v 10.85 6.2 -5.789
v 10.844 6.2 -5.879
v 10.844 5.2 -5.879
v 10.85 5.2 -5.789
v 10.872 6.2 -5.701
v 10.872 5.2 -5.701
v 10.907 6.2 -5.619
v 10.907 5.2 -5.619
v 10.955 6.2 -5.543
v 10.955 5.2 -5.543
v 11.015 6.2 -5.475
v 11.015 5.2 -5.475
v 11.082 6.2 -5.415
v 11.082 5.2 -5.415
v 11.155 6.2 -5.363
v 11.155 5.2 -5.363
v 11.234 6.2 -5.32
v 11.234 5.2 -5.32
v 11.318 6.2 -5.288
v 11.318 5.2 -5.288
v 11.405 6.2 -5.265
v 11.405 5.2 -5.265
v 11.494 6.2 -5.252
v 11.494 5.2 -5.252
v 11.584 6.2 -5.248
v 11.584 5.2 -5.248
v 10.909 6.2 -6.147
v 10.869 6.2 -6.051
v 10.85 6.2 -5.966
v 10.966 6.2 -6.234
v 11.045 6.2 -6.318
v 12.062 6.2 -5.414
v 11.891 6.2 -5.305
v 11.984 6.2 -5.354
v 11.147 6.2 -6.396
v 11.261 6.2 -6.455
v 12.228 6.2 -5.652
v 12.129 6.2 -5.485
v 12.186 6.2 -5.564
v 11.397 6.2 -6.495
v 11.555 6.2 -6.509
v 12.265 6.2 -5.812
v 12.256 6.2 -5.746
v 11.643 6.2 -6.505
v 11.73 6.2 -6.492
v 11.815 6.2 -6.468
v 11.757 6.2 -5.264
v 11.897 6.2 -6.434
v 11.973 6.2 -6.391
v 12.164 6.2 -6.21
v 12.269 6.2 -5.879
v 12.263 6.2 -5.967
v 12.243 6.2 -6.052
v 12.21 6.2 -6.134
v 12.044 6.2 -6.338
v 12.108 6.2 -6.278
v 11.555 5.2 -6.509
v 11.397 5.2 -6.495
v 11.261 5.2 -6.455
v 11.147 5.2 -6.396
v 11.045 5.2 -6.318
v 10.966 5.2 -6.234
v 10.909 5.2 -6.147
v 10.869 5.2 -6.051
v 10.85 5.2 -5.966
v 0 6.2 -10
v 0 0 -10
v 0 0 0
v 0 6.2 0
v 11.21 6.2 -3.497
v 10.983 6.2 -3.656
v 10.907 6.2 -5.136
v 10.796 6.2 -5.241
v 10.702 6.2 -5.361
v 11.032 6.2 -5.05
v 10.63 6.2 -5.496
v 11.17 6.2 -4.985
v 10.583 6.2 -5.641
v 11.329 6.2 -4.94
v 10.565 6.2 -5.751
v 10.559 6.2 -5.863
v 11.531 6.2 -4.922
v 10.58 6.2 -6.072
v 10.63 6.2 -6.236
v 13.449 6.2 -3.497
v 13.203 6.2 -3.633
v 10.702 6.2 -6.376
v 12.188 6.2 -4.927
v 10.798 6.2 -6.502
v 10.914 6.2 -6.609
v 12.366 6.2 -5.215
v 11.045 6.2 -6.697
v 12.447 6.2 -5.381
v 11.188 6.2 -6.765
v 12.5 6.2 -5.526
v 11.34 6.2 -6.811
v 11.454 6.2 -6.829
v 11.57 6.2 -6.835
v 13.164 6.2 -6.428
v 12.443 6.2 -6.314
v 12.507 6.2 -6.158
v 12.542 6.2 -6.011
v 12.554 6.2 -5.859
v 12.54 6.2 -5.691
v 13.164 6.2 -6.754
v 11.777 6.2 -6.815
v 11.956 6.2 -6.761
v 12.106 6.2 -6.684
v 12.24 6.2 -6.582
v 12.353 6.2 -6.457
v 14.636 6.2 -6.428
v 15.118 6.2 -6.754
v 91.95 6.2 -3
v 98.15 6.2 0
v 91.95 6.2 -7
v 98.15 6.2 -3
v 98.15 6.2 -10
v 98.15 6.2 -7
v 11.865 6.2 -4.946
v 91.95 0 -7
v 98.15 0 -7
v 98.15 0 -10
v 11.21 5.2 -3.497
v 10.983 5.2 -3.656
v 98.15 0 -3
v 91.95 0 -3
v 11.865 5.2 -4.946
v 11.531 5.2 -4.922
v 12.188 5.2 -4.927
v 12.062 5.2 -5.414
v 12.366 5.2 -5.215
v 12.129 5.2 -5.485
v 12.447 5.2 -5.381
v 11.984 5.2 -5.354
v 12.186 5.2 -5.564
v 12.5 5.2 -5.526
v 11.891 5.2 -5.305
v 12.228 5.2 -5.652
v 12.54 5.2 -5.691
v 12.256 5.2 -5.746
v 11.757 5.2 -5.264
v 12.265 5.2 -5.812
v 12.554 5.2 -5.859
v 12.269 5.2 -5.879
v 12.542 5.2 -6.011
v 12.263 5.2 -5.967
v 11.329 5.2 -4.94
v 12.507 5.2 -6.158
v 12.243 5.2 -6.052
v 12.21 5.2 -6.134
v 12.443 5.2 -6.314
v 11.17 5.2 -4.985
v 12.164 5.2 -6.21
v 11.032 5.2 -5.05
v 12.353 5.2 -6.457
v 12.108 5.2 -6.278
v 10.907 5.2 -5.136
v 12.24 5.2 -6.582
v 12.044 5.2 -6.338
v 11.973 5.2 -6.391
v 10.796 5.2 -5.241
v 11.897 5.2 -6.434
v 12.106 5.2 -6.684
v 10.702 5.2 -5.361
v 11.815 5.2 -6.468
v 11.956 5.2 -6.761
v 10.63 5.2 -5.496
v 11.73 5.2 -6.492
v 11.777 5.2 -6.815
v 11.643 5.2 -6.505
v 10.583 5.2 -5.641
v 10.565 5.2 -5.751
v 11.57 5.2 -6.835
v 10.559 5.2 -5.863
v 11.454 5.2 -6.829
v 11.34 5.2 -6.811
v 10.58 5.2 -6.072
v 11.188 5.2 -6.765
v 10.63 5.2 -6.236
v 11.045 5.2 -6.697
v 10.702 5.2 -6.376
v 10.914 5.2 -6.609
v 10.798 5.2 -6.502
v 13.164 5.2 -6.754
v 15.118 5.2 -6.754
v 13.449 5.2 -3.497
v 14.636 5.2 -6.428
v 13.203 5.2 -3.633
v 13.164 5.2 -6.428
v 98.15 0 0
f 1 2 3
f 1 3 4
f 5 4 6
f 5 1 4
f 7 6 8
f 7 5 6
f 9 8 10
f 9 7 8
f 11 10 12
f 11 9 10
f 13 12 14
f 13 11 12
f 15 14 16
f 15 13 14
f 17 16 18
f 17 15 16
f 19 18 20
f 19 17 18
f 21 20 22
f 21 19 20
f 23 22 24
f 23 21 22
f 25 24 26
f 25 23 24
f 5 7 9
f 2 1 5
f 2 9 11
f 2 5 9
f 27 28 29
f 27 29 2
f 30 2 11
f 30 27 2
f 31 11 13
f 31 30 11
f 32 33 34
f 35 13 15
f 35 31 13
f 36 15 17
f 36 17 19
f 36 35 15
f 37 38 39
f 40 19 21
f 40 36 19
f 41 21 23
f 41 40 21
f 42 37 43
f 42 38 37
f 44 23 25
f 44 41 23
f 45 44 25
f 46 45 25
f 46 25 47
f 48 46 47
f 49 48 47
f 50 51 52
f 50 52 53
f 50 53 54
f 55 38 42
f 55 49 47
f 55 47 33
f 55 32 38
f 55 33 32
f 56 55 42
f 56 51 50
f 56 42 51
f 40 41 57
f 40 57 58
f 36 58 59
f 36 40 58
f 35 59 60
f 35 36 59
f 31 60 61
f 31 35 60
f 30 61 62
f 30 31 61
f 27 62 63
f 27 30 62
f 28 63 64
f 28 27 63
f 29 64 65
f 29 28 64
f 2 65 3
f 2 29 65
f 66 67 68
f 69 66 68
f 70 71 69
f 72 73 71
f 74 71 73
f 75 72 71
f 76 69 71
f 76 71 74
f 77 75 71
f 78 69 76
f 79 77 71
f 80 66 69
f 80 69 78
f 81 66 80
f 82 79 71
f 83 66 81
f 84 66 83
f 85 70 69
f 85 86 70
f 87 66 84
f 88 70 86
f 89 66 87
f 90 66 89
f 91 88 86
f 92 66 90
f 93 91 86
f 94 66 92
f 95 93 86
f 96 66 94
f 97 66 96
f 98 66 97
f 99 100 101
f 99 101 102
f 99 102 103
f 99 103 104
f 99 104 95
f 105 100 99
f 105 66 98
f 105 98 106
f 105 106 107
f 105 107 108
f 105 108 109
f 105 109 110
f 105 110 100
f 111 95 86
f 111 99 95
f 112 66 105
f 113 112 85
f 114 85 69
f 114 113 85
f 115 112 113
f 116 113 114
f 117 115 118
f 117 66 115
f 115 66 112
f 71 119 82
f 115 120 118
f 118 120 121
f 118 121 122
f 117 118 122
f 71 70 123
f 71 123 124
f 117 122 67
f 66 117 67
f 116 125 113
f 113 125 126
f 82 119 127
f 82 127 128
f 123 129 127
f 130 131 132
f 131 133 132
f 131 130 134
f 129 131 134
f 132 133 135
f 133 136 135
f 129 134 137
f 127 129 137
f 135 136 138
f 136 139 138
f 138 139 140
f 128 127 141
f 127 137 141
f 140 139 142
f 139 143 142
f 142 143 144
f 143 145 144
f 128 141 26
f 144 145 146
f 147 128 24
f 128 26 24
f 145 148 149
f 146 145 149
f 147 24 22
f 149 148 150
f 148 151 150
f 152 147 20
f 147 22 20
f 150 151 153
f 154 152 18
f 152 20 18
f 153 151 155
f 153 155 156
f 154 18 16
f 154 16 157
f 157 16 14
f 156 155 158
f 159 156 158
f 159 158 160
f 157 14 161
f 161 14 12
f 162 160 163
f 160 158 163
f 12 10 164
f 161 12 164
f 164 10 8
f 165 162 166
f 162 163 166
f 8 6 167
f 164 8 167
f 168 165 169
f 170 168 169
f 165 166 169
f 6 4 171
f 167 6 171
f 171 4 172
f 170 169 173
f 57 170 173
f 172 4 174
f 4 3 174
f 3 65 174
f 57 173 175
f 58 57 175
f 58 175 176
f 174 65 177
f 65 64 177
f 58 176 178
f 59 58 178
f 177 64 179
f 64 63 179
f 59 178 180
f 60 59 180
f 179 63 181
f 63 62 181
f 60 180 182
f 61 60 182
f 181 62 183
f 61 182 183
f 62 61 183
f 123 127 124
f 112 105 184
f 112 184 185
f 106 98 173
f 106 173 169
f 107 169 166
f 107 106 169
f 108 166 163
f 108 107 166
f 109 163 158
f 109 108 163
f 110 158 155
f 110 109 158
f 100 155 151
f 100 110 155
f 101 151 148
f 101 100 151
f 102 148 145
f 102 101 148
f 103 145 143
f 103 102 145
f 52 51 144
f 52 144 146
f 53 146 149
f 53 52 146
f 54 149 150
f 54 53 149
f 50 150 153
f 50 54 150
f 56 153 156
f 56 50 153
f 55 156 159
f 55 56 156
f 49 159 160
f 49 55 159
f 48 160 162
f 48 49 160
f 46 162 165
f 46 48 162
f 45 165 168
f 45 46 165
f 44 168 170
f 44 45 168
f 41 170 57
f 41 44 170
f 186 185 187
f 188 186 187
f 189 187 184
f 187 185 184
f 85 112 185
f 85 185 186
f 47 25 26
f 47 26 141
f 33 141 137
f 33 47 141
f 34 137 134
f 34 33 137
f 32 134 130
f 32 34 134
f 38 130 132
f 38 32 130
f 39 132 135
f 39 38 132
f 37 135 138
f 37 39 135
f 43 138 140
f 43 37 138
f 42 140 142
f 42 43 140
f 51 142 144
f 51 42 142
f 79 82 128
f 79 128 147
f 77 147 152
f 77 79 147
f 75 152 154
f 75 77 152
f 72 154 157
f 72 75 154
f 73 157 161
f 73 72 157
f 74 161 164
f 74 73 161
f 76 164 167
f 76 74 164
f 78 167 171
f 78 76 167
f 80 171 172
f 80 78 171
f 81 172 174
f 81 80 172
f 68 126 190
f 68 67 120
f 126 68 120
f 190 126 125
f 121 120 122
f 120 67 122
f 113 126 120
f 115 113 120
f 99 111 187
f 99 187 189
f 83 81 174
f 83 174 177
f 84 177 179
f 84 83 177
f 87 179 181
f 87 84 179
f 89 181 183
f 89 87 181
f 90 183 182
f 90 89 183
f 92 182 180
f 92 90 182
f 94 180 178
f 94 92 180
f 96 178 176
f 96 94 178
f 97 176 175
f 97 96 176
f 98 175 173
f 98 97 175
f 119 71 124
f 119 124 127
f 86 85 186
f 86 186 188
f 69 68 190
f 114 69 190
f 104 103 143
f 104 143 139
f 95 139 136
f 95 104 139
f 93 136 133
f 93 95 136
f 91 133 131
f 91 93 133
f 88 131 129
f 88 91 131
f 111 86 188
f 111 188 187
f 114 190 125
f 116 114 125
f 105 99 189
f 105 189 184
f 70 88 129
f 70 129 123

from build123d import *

# Parameters (mm, degrees)
BOSS_EXTRUDE1_DEPTH = 6.2
CUT_EXTRUDE1_DEPTH  = 1


with BuildPart() as part:
    # Sketch1 → Boss-Extrude1 (new body)
    with BuildSketch(Plane(origin=(0, 0, 0), x_dir=(1, 0, 0), z_dir=(0, 1, 0))):
        Polygon((0, 0), (91.95, 0), (98.15, 0), (98.15, 3), (93.712314791, 3), (91.95, 3), (91.95, 7), (93.712314791, 7), (98.15, 7), (98.15, 10), (91.95, 10), (0, 10), align=None)
    extrude(amount=BOSS_EXTRUDE1_DEPTH)

    # Sketch2 → Cut-Extrude1 (cut)
    with BuildSketch(Plane(origin=(0, 6.2, 0), x_dir=(1, 0, 0), z_dir=(0, 1, 0))):
        with BuildLine():
            Line((11.210257143, 3.497319833), (10.982562832, 3.655688223))
            Line((10.982562832, 3.655688223), (11.8653553, 4.94616799))
            add(Edge.make_bspline(
                [(11.8653553, 4.94616799), (11.809030133, 4.939279997), (11.698122738, 4.925717154), (11.586419796, 4.923225546), (11.531446045, 4.92199932)],
                knots=[0, 0, 0, 0, 0.000170115, 0.000334967, 0.000334967, 0.000334967, 0.000334967], degree=3))
            add(Edge.make_bspline(
                [(11.531446045, 4.92199932), (11.498115759, 4.922853011), (11.432691322, 4.924528731), (11.336505466, 4.937810943), (11.244080707, 4.958267131), (11.155662077, 4.988791358), (11.070917241, 5.026726448), (10.990031201, 5.073768168), (10.913112843, 5.129109589), (10.840988264, 5.192458089), (10.775391186, 5.262016036), (10.716950052, 5.335635798), (10.668380597, 5.414172571), (10.62803398, 5.496024271), (10.59743564, 5.582367353), (10.575153909, 5.672219309), (10.561435774, 5.76620987), (10.559803737, 5.830186239), (10.558975092, 5.862669392)],
                knots=[0, 0, 0, 0, 9.9954e-05, 0.000196201, 0.000290782, 0.000383503, 0.000476303, 0.000568919, 0.000663705, 0.000760153, 0.000856434, 0.000950205, 0.001041624, 0.001132931, 0.001223461, 0.001315861, 0.001410305, 0.001507717, 0.001507717, 0.001507717, 0.001507717], degree=3))
            add(Edge.make_bspline(
                [(10.558975092, 5.862669392), (10.560548472, 5.907090956), (10.563636698, 5.994281474), (10.588491067, 6.121674964), (10.629367232, 6.242131329), (10.686361545, 6.355333862), (10.758148043, 6.459654147), (10.844425121, 6.553641957), (10.944668003, 6.635960503), (11.05659312, 6.706721344), (11.17756336, 6.763630949), (11.304262786, 6.8055766), (11.435720595, 6.83024975), (11.524772696, 6.833502638), (11.569607103, 6.835140346)],
                knots=[0, 0, 0, 0, 0.000133185, 0.000261414, 0.000387724, 0.00051373, 0.000640399, 0.00076644, 0.000895188, 0.001028407, 0.001162697, 0.001295241, 0.001427846, 0.0015623, 0.0015623, 0.0015623, 0.0015623], degree=3))
            add(Edge.make_bspline(
                [(11.569607103, 6.835140346), (11.613593027, 6.833480127), (11.700505066, 6.83019969), (11.828311522, 6.806174946), (11.950722301, 6.765683107), (12.067058825, 6.709726396), (12.174772434, 6.639585287), (12.271633349, 6.556006112), (12.355431159, 6.458936812), (12.426028537, 6.35072511), (12.482697788, 6.234459349), (12.523584787, 6.113098219), (12.548754046, 5.987514522), (12.551925714, 5.902429535), (12.553526374, 5.859489304)],
                knots=[0, 0, 0, 0, 0.000131915, 0.000260652, 0.000388569, 0.000517718, 0.000646848, 0.000773094, 0.000900237, 0.001030248, 0.001159674, 0.001287189, 0.001413545, 0.001542287, 0.001542287, 0.001542287, 0.001542287], degree=3))
            add(Edge.make_bspline(
                [(12.553526374, 5.859489304), (12.552457389, 5.826157458), (12.55028922, 5.758552146), (12.535106998, 5.65583605), (12.50932583, 5.551105292), (12.480068932, 5.462457844), (12.451827608, 5.38924375), (12.425247296, 5.33141196), (12.395754128, 5.270541528), (12.361356391, 5.207270729), (12.324379165, 5.140793001), (12.282596821, 5.071775108), (12.236962481, 5.000124436), (12.204459807, 4.95182172), (12.187816238, 4.927087461)],
                knots=[0, 0, 0, 0, 9.9984e-05, 0.000202793, 0.000310776, 0.000423207, 0.000482616, 0.000546097, 0.000614079, 0.0006855, 0.000762103, 0.000842274, 0.000927493, 0.001016928, 0.001016928, 0.001016928, 0.001016928], degree=3))
            Line((12.187816238, 4.927087461), (11.210257143, 3.497319833))
        make_face()
        with BuildLine():
            add(Edge.make_bspline(
                [(11.584235509, 5.247640346), (11.609484936, 5.248330123), (11.658636986, 5.249672883), (11.730643536, 5.257845553), (11.798610492, 5.27233624), (11.862719411, 5.293127693), (11.923613101, 5.318216243), (11.980324341, 5.350158545), (12.032900595, 5.388273635), (12.081693929, 5.431099863), (12.1250227, 5.478680036), (12.163615307, 5.528479554), (12.196418107, 5.580717021), (12.22232908, 5.636046624), (12.243632945, 5.69312152), (12.258344999, 5.752860828), (12.266495072, 5.814953306), (12.26788443, 5.857134231), (12.268590477, 5.878569833)],
                knots=[0, 0, 0, 0, 7.5753e-05, 0.000147465, 0.000217073, 0.000283852, 0.000349411, 0.000414338, 0.000478589, 0.000543925, 0.000608743, 0.000671332, 0.000732749, 0.000793345, 0.000854313, 0.000915245, 0.00097749, 0.001041807, 0.001041807, 0.001041807, 0.001041807], degree=3))
            add(Edge.make_bspline(
                [(12.268590477, 5.878569833), (12.267982991, 5.900014387), (12.266785866, 5.94227351), (12.257181673, 6.004457916), (12.240285935, 6.064051089), (12.217615995, 6.121379279), (12.187752636, 6.175971473), (12.151917331, 6.228513071), (12.109342895, 6.27867093), (12.060354853, 6.325265401), (12.007527794, 6.368216709), (11.951230054, 6.40612265), (11.891925666, 6.437891878), (11.829976436, 6.464107372), (11.765253291, 6.484565054), (11.69779453, 6.499276521), (11.62725927, 6.507415184), (11.579379103, 6.50879576), (11.554978698, 6.50949932)],
                knots=[0, 0, 0, 0, 6.4316e-05, 0.000126743, 0.000188161, 0.000249812, 0.000311283, 0.000374438, 0.00044032, 0.000508243, 0.00057698, 0.000644365, 0.000711521, 0.0007785, 0.000845884, 0.000914871, 0.00098532, 0.001058531, 0.001058531, 0.001058531, 0.001058531], degree=3))
            add(Edge.make_bspline(
                [(11.554978698, 6.50949932), (11.530790501, 6.508794623), (11.48333346, 6.507412013), (11.413425258, 6.499291991), (11.346422627, 6.484466116), (11.281887014, 6.464116848), (11.219939625, 6.437889922), (11.160638034, 6.406120985), (11.104327126, 6.368225435), (11.051550715, 6.325231606), (11.002476171, 6.278887812), (10.960633727, 6.228293345), (10.924716411, 6.175998805), (10.894894087, 6.121372015), (10.872213232, 6.064053027), (10.855320416, 6.004457391), (10.845715438, 5.942273646), (10.84451842, 5.900014433), (10.843910989, 5.878569833)],
                knots=[0, 0, 0, 0, 7.2576e-05, 0.000142393, 0.000210758, 0.000278143, 0.000345121, 0.000412278, 0.000479663, 0.0005484, 0.000616323, 0.000681795, 0.00074495, 0.000806421, 0.000868072, 0.00092949, 0.000991917, 0.001056233, 0.001056233, 0.001056233, 0.001056233], degree=3))
            add(Edge.make_bspline(
                [(10.843910989, 5.878569833), (10.844460651, 5.857117539), (10.845544684, 5.814809687), (10.856002036, 5.752646459), (10.87349019, 5.693057883), (10.896912066, 5.635464556), (10.927756365, 5.580426514), (10.965605856, 5.528204693), (11.009970173, 5.478207106), (11.060256265, 5.431210563), (11.115290954, 5.388073947), (11.174070859, 5.350399958), (11.235584069, 5.31858424), (11.300047119, 5.293055985), (11.366982288, 5.272543976), (11.436991157, 5.25787226), (11.509842201, 5.249751275), (11.559199827, 5.24835074), (11.584235509, 5.247640346)],
                knots=[0, 0, 0, 0, 6.4316e-05, 0.000126844, 0.000188436, 0.000250326, 0.000312966, 0.000377217, 0.000443451, 0.000513196, 0.000583426, 0.000652939, 0.000722346, 0.000790847, 0.000860662, 0.000932137, 0.001005113, 0.00108023, 0.00108023, 0.00108023, 0.00108023], degree=3))
        make_face(mode=Mode.SUBTRACT)
        Polygon((13.164103297, 6.75373009), (15.117949451, 6.75373009), (13.449039195, 3.497319833), (13.202900372, 3.632791588), (14.635848089, 6.428089064), (13.164103297, 6.428089064), align=None)
    extrude(amount=-CUT_EXTRUDE1_DEPTH, mode=Mode.SUBTRACT)


solid = part.part
